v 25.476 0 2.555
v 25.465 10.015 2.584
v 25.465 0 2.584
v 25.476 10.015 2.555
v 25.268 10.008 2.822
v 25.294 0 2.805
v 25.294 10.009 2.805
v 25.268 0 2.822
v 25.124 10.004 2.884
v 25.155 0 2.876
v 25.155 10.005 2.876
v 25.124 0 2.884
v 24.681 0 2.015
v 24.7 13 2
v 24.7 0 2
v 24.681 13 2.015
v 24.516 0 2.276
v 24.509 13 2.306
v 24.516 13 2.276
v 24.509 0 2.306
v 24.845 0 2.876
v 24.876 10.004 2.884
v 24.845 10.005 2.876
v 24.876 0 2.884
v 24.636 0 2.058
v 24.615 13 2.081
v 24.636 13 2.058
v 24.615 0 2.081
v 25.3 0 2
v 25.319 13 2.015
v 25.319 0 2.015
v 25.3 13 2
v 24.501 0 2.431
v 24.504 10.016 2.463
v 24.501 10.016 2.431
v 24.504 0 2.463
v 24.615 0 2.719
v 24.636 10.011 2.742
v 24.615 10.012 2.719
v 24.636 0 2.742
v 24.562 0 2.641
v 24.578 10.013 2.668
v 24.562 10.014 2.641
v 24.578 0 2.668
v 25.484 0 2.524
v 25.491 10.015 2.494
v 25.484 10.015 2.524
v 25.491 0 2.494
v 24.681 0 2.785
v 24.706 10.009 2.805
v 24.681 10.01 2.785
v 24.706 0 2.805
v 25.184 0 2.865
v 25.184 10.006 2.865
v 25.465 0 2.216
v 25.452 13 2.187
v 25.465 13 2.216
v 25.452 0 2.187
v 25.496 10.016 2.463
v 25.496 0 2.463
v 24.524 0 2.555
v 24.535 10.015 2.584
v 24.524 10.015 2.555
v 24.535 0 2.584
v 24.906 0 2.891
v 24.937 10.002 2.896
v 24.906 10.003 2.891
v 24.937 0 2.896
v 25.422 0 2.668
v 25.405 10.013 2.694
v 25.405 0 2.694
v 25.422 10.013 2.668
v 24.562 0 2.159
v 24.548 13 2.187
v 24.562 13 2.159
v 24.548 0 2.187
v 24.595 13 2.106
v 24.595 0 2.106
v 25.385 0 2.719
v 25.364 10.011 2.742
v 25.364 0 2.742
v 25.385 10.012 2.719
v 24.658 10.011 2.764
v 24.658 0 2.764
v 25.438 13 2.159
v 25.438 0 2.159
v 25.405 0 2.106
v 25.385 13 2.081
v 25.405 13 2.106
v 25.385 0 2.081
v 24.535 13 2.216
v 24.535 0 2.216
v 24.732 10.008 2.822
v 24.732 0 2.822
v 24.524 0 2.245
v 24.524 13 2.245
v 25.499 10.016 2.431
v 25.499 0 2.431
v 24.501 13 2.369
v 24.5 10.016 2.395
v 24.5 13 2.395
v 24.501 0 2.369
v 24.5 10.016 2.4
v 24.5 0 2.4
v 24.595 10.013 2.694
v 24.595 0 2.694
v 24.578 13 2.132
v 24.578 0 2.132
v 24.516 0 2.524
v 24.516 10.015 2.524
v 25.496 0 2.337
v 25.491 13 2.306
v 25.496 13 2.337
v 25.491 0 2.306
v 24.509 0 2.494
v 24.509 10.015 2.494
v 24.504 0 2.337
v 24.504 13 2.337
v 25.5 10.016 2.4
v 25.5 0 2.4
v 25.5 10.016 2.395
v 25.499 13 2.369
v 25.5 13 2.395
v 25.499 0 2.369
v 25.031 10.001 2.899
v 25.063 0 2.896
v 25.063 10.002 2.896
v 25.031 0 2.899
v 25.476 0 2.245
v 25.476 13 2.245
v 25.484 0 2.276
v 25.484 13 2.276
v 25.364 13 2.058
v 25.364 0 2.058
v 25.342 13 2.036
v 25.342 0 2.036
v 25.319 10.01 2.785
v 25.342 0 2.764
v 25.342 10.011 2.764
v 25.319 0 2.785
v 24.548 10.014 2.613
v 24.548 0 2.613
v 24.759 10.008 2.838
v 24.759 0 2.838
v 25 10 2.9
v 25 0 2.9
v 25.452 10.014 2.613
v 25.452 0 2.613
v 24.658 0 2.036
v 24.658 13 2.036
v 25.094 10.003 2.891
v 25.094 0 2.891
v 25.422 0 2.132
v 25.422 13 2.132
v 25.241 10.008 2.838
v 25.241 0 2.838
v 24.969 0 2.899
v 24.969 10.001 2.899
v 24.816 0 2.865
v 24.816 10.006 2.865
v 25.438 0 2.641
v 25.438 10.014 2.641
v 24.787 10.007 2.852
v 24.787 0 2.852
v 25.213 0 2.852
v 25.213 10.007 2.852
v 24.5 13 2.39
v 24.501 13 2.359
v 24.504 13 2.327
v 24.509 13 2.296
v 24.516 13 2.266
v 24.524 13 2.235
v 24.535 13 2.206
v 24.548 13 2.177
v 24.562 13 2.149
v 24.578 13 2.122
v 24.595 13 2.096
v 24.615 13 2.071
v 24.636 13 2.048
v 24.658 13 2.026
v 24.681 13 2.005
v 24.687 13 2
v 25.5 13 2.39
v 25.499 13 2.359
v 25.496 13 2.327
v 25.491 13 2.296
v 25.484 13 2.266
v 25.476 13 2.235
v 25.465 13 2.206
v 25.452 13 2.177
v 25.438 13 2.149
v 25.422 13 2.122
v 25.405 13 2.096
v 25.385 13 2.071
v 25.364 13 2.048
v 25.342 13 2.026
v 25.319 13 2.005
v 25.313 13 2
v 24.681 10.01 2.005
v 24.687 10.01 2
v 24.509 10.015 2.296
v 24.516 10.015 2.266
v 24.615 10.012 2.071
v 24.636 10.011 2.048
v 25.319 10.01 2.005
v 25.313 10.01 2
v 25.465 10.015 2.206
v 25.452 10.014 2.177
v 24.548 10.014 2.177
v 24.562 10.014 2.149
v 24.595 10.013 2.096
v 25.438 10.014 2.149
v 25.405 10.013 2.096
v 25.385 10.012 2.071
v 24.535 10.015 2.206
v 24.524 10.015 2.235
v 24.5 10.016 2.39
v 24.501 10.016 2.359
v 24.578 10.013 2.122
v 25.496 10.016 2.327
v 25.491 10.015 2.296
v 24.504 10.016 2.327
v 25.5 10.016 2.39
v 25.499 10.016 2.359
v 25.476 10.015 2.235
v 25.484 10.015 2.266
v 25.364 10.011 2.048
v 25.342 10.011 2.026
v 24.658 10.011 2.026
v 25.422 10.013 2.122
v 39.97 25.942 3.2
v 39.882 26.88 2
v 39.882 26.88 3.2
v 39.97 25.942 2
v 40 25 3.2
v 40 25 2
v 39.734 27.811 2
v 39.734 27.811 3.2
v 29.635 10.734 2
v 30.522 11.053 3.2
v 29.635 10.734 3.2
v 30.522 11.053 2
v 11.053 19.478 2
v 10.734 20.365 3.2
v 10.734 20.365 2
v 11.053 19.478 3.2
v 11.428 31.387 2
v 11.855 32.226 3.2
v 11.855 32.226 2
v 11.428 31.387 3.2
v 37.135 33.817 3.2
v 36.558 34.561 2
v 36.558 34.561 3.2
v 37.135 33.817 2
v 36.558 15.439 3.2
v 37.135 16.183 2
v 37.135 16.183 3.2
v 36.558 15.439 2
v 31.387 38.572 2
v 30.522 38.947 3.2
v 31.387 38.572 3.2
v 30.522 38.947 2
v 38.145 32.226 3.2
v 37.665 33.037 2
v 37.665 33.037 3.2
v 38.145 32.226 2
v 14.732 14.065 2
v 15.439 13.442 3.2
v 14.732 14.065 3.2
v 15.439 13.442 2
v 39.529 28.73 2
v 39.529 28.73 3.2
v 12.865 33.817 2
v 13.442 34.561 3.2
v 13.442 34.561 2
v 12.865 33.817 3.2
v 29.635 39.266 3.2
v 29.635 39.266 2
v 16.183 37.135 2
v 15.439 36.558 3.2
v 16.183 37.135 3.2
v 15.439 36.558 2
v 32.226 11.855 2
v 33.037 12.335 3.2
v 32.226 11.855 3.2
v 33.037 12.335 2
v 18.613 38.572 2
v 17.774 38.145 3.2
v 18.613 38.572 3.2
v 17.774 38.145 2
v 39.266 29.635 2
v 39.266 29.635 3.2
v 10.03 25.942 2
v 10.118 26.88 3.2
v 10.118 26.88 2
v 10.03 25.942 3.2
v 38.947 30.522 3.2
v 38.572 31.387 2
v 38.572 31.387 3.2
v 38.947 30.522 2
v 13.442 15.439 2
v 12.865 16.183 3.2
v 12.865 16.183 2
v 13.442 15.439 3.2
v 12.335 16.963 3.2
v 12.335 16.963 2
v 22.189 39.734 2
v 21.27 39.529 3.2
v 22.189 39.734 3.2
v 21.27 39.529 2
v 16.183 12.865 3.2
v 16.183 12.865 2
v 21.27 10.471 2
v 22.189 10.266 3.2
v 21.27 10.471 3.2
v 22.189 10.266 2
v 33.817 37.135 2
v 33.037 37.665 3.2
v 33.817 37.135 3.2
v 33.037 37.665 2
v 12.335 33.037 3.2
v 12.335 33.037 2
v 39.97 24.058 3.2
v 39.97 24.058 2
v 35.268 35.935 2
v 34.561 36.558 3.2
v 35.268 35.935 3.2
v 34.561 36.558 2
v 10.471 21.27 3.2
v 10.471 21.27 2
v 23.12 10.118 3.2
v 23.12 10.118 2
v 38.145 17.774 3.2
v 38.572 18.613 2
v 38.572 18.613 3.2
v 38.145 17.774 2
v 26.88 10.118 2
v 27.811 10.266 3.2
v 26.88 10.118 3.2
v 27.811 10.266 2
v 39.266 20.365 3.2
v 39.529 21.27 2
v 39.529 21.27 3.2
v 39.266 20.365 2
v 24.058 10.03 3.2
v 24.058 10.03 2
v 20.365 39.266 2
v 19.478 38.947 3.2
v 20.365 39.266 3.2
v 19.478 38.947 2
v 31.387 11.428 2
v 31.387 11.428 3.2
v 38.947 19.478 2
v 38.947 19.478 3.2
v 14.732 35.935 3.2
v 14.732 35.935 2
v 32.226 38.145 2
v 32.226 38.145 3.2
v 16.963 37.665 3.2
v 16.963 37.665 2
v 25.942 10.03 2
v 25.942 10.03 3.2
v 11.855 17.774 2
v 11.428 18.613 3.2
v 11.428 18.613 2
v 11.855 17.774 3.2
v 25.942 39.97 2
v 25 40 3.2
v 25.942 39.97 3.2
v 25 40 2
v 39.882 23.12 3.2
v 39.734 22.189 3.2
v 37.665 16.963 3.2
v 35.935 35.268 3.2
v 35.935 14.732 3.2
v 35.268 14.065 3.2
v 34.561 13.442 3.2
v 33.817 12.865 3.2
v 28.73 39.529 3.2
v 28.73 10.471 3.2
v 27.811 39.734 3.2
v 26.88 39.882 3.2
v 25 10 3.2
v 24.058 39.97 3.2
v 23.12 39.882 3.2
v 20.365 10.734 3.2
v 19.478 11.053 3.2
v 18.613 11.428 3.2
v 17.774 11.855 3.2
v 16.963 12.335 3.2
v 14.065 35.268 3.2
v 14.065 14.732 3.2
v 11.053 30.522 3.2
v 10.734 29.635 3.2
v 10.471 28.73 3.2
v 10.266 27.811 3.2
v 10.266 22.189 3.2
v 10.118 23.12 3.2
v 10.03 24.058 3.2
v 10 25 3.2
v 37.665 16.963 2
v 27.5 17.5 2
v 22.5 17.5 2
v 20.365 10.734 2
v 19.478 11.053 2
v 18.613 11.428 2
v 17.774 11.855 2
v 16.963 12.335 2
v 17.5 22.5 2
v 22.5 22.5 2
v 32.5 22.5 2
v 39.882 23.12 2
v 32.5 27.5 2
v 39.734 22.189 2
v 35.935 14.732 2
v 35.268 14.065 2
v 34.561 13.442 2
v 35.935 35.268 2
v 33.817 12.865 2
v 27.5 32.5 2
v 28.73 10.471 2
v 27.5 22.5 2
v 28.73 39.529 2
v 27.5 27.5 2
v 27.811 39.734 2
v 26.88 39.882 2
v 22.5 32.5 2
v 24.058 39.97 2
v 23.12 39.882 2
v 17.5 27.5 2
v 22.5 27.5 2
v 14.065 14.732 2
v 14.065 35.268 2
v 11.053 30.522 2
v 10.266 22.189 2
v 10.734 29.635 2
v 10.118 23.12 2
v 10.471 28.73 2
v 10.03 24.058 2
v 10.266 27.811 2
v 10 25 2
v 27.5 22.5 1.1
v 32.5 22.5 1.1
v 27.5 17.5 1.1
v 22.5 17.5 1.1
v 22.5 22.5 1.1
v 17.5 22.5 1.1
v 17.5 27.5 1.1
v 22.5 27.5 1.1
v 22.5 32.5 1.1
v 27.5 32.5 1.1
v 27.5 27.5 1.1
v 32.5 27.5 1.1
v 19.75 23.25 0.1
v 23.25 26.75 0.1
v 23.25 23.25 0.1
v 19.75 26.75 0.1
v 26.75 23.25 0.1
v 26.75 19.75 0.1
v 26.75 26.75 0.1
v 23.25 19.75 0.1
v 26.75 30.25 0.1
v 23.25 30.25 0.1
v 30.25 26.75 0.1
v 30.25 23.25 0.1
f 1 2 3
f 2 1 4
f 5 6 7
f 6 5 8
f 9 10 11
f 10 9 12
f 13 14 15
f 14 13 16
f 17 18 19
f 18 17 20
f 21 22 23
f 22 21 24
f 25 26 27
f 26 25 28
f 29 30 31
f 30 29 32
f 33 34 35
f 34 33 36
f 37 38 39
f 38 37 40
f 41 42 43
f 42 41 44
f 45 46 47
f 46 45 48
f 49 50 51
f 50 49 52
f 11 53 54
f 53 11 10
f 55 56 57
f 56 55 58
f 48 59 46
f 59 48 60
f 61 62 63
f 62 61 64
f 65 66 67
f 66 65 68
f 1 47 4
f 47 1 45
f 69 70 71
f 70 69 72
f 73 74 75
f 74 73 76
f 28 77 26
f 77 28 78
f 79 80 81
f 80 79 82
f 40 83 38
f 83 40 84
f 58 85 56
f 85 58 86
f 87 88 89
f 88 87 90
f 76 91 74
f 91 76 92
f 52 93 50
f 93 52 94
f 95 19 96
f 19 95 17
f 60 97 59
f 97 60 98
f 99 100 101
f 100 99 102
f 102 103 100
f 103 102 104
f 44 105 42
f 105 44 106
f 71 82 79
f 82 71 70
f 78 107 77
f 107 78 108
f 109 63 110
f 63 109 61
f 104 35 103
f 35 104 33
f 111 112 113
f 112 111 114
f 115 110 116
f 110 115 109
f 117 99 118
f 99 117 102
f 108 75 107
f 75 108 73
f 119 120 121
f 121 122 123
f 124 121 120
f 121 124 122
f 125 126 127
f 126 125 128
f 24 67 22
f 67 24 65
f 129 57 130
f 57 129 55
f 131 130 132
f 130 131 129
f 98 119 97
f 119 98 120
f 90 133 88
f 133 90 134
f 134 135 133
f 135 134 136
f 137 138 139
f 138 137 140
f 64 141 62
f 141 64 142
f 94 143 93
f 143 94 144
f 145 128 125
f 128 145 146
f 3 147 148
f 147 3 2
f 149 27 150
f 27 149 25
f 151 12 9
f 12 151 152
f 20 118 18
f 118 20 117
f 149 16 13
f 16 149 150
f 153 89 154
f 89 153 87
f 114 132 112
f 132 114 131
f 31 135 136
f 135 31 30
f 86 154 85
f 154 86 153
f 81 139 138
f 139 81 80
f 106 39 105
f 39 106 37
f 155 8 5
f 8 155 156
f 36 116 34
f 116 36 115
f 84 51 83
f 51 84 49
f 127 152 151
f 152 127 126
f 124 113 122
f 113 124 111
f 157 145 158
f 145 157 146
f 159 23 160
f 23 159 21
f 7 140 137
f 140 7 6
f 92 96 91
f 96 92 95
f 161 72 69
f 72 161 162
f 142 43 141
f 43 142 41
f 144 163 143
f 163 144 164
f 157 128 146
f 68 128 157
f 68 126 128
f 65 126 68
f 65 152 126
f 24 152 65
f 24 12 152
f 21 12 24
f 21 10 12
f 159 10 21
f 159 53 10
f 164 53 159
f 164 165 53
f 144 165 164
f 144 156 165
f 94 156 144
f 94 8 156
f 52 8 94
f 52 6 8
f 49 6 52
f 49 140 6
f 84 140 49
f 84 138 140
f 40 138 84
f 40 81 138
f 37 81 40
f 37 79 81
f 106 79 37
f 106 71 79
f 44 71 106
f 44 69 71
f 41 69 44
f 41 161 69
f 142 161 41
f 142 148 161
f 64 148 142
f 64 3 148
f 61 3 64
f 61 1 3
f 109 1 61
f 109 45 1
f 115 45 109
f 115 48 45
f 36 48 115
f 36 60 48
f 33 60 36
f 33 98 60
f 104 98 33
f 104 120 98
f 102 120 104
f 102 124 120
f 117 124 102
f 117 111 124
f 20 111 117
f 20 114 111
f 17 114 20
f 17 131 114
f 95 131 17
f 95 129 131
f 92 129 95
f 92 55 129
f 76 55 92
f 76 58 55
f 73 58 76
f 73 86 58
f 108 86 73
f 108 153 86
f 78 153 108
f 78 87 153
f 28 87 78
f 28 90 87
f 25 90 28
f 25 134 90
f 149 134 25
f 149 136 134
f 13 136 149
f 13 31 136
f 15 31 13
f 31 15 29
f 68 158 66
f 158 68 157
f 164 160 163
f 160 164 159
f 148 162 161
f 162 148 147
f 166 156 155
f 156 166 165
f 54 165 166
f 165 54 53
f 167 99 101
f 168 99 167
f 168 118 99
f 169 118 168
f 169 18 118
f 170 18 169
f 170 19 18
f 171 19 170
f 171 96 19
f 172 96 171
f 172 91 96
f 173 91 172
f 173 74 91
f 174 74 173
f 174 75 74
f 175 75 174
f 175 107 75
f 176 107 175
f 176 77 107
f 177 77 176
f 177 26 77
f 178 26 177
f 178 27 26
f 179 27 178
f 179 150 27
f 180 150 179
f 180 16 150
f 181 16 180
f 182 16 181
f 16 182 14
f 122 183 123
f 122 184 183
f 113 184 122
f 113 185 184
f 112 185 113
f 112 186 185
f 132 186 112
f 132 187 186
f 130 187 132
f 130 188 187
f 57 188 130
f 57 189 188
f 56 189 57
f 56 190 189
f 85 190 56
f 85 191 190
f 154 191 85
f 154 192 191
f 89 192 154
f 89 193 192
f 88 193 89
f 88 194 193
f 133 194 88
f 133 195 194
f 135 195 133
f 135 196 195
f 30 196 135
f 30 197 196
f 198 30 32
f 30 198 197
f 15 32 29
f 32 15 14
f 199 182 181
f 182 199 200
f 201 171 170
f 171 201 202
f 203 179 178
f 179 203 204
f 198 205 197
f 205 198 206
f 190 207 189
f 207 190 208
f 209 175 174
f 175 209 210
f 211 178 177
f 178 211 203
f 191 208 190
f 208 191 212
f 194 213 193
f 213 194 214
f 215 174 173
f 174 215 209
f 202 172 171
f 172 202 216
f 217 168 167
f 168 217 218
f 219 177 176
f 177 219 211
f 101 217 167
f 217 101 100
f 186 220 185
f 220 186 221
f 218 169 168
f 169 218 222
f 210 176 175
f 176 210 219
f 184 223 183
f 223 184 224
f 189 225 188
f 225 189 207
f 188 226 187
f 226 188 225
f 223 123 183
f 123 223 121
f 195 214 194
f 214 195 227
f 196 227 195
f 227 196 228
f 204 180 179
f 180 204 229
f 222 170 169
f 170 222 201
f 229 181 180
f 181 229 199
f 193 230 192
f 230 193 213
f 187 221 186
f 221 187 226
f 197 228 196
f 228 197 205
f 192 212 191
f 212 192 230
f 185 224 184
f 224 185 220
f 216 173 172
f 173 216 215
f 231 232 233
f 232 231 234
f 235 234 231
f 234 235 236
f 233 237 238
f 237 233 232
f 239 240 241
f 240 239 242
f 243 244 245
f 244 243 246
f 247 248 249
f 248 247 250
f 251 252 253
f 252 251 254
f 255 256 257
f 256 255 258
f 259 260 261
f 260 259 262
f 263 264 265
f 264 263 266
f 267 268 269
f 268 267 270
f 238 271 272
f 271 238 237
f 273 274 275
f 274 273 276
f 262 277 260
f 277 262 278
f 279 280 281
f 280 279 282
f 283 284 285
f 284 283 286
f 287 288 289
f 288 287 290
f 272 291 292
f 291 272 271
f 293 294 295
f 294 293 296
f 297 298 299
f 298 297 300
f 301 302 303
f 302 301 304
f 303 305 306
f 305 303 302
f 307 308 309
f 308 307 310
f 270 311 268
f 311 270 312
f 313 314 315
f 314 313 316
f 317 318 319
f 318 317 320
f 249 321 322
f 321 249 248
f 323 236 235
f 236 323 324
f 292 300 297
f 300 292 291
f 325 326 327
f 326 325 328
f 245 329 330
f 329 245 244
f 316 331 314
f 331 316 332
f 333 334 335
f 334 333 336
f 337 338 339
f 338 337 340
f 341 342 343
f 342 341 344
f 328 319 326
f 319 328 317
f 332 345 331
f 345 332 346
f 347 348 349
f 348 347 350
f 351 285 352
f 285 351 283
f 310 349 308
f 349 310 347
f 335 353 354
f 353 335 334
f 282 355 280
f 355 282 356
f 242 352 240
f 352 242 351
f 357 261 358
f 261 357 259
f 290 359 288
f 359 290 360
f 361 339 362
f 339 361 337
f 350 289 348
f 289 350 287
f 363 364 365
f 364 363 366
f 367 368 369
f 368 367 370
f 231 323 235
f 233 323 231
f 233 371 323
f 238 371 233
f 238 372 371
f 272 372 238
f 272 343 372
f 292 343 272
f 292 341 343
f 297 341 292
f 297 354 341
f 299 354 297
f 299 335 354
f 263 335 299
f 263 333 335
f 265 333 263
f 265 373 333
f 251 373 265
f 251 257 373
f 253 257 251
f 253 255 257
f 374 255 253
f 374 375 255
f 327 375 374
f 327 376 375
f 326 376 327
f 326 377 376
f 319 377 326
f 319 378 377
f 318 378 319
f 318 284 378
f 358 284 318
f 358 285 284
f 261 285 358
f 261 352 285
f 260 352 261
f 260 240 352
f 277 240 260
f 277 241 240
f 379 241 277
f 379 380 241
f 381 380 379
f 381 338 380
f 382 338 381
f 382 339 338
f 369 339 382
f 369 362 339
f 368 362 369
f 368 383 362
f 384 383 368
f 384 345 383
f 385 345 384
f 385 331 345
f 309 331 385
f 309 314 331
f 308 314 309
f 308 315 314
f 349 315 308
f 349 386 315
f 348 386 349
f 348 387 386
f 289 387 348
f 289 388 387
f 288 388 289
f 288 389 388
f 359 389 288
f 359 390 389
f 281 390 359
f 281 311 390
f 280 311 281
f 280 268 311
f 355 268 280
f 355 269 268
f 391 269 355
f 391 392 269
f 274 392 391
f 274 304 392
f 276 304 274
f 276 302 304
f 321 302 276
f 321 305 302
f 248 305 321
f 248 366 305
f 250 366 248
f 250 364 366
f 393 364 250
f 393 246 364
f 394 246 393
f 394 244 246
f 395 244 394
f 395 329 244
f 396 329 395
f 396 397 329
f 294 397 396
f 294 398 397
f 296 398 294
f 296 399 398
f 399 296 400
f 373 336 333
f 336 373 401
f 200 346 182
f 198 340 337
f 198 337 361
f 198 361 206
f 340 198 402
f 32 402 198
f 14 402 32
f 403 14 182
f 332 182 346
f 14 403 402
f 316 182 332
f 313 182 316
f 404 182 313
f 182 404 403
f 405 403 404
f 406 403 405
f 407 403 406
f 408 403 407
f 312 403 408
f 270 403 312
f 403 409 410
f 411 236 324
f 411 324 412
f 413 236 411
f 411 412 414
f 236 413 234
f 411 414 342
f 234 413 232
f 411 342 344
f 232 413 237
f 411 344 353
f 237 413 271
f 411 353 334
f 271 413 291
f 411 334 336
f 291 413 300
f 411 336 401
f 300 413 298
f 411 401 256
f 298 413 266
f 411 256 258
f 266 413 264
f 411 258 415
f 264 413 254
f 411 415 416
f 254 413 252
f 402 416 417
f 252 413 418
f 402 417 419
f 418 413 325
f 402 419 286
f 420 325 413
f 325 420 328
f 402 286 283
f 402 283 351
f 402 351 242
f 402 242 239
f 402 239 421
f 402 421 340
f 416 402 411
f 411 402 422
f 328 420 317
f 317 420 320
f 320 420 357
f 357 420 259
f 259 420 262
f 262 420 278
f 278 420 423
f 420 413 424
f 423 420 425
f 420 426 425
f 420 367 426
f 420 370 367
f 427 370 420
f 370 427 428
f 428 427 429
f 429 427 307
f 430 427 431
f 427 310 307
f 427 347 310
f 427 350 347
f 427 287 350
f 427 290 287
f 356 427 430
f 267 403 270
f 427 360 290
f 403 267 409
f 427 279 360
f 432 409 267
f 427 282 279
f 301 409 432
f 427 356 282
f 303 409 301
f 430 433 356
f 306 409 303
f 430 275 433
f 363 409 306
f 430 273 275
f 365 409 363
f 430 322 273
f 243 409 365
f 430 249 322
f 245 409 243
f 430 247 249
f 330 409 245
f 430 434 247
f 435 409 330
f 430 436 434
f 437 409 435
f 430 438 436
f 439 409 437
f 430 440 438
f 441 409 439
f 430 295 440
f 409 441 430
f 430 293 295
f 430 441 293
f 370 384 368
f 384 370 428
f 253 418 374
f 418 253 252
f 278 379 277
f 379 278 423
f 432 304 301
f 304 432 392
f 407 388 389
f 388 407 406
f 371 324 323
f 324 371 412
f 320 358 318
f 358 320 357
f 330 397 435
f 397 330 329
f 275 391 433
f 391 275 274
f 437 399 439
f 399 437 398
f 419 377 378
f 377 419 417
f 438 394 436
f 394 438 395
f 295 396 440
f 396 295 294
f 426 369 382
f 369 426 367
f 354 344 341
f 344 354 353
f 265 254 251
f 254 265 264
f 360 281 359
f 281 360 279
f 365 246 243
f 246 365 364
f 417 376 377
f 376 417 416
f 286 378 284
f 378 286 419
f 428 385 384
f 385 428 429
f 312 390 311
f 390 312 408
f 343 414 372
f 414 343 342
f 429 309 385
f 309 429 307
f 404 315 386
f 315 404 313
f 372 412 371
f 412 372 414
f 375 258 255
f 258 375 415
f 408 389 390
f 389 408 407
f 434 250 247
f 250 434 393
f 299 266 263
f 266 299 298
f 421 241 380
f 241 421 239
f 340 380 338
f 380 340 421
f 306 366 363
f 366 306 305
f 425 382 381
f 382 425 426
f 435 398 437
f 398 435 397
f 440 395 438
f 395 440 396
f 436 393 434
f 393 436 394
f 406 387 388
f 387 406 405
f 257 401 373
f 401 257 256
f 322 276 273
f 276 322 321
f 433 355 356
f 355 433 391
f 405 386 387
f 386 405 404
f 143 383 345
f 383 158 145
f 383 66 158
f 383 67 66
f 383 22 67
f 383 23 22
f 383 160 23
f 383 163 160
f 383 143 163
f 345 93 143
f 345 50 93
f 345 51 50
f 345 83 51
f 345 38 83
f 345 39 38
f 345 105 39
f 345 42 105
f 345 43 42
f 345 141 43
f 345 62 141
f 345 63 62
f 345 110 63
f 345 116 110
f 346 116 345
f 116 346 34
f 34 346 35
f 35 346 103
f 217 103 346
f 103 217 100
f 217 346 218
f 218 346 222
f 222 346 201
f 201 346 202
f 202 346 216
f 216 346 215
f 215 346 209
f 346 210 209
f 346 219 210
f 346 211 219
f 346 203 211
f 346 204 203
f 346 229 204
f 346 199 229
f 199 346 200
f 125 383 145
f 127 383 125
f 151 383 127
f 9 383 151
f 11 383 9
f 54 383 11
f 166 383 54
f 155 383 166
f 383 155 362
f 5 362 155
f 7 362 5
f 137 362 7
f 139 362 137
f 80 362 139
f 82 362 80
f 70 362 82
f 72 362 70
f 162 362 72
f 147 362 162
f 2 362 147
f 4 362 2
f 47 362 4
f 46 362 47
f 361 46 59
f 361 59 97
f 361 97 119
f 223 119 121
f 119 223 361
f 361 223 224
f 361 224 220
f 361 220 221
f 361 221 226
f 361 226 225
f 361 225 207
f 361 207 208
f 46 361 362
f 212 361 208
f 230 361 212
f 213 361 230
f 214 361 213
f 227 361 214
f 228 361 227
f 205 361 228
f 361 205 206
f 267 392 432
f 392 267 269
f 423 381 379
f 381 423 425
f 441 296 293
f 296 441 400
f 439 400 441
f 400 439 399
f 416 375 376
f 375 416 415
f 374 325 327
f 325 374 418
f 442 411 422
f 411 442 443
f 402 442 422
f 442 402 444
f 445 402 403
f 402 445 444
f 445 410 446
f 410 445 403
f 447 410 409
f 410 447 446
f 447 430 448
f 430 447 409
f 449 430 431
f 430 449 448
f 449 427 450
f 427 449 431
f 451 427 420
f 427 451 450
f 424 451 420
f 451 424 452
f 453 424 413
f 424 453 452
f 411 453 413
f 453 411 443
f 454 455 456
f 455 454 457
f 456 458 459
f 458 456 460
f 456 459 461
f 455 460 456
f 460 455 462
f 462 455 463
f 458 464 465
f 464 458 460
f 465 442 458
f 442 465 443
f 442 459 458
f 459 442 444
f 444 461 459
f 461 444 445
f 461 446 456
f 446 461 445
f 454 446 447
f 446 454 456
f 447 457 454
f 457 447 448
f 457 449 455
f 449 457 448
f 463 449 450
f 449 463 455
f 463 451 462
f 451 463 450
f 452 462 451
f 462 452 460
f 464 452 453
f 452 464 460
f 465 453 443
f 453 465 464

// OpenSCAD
//(c) Inne Lemstra
/* Based on softrobotics bubble mold v4*/
//has new air inlet system
$fn = 100;

render_bubble = true;
render_bubble_air_inlet = true;
render_bubble_inlet_hole = true;
render_screw_pillars = false;
render_walls_plexi = false;
render_walls_print = false;
render_grooves = false;
render_base = false;

render_bubble_needle_inlet = false;


render_component_central_cross = false;
render_component_pillar = false;
render_component_pillar_cross = false;
render_component_central_tube = false;
render_component_inverse_pillar = false;
render_component_air_inlet = false;

h_box = 10;
thickness_box = 3;

thickness_plexi = 3.2; // how thick the plexiglass is
groove_plexi = 1.5; //how deep the groove is
offset_groove = 10; //space the base extends past plexi walls

//plexiglass walls
ratio_plexi_connect = 0.7; //for the gaps in the backplate
h_plexi_front = 15; //heigth front panel (so it can slide in/out)
h_plexi = 20; //heigth for the rest of the panels

dia_screw = 3.5;
offset_screw = 6;

len_base = 50;
w_base = 50; // unnecesary for now because base is square
h_base = 2;


dia_air_pocket = 30;
h_air_pocket = 1.2; //heigth air pocket


//air inlet parameters
n_inlets = 2; //does not seem to work

dia_coupler = 1;
len_coupler = 4;

len_transition = 2;

dia_supply_tube = 1;
len_supply_tube = 13;
offset_tube_h = dia_supply_tube * 0.40;



w_connector_base = 5;
h_connector_base = 2;   //mayve this should be h_base by default

corner_coord = [[0,0], [0,1], [1,1], [1,0]];


module air_inlet(len_coupler, dia_coupler, len_transition, dia_supply_tube, len_supply_tube ,offset_tube_h,  len_base, h_base){

    difference(){
        union(){
    color("blue"){
        rotate([0,90,0]){
        //supply_tube
            translate([-h_base - offset_tube_h,0,0]){
        //coupler
            cylinder(len_coupler, d = dia_coupler);
            //transision piece
            translate([0, 0 , len_coupler]){
                cylinder(len_transition, d1 = dia_coupler, d2 = dia_supply_tube);
            }
        //supply tube
            cylinder(len_supply_tube, d = dia_supply_tube);
        }
    }
    }
    }
    neg_z_zone = 50; //make sure everything below z axis gets removed
    translate([0,dia_coupler / -2, -neg_z_zone]){
        cube([len_supply_tube* 1.1, dia_coupler * 1.1, h_base +neg_z_zone]);
        }
    
}
}

module bar_connect(width, length, depth){
        union(){
    //move connector under z plane of origin
        translate([0,0, -depth /2]){
            //left most side
            translate([-width, 0,0]) cube([width, length, depth], center = true);
            //middle side
            cube([width, length, depth], center = true);            
            //right most side
            translate([width, ,0]) cube([width, length, depth], center = true);
        }
    }
    
    }
    
module draw_cross(width){
    //draws a 2D cross/plus shape total width is 3 * width
    union(){   
            //left most side
            translate([-width, 0,0]) square([width, width], center = true);
            //middle side
            square([width, width], center = true);
            //midle top
            translate([0, width, 0]) square([width, width], center = true);
            //midle bottom
            translate([0, -width, 0]) square([width, width], center = true);
            
            //right most side
            translate([width, ,0]) square([width, width], center = true);
        }
}
    

module cross_connect(width, depth, taper_size = 0.7, taper_ratio = 0.5){
    
     if(taper_ratio < 1){
        linear_extrude(height = depth * (1 - taper_ratio)) draw_cross(width);
     }
     if(taper_ratio > 0){
        translate([0, 0,depth * (1 - taper_ratio)]){
            linear_extrude(height = depth * taper_ratio, scale = taper_size){
            draw_cross(width);
            }
        }
    }
}


module make_screw_pillars(len_base, dia_screw, offset_screw, h_base, h_box, corner_coord, taper_size = 0.8, taper_ratio = 0.3 ,n = 4){
    translate([0,0,h_base]){
        for(i = [0:n-1]){
        coord_x  = len_base * corner_coord[i][0];
        coord_y  = len_base * corner_coord[i][1];
        // * -2 + [1,1] makes coord 0 (+) and 1 (-)
        corner_offset = (corner_coord[i] * -2 + [1, 1]) * offset_screw;
        translate([coord_x + corner_offset[0], coord_y + corner_offset[1], 0]){
            color("orange"){
                if(!render_component_inverse_pillar){
        cylinder(h_box - h_base, d = dia_screw);
                }else{
                translate([0,0,h_base])
                    cylinder(h_box - h_base, d = dia_screw);
            }
            }
            color("red"){
                if(!render_component_inverse_pillar){
                rotate([0,180,0]) cross_connect(2, h_base, taper_size, taper_ratio);
                }else{
                cross_connect(2, h_base, taper_size, taper_ratio);
             }
            }
        }
            //echo(corner_offset);  
        }
}
}

module make_volume_marks(h_plexi, groove_plexi, len_plexi, w_thick = 4, h_thick = 0.5, nr_size = 2, step_volume = 2.5){
    
    for(idx =[0:step_volume:h_plexi - step_volume + 0.1]){
    
    color("blue"){
        translate([len_plexi/2, idx + groove_plexi, 0]){
            square([w_thick, h_thick], center = true);
            translate([w_thick/2 + 2, - nr_size/2,0]){
            text(str(idx), nr_size);
            }
        }
    }
}

}

if(render_base){
    difference(){
    //ground plate
        cube([len_base, len_base, h_base]);
        translate([len_base / 2, w_base/ 2, -0.1]){
           cross_connect(w_connector_base, h_base + 0.2, taper_size = 1, taper_ratio = 0.5);
        }
        make_screw_pillars(len_base, dia_screw, offset_screw, h_base, h_box,corner_coord, taper_size = 1, taper_ratio = 1);
        
    }
}


//screw locations
if(render_screw_pillars){
for(i = [0:3]){
    coord_x  = len_base * corner_coord[i][0];
    coord_y  = len_base * corner_coord[i][1];
    // * -2 + [1,1] makes coord 0 (+) and 1 (-)
    corner_offset = (corner_coord[i] * -2 + [1, 1]) * offset_screw;
    translate([coord_x + corner_offset[0], coord_y + corner_offset[1], h_base]){
        color("orange"){
    cylinder(h_box - h_base + 0.01, d = dia_screw);
        }
        color("red"){
            cross_connect(2, h_base);
        }
    }
  echo(corner_offset);  
}
}



if(render_bubble){
    if(render_bubble_air_inlet){
        
       // for(i = [0:n_inlet){
        //left inlet
//                    translate([0, len_base / 2 , 0]){
//                        air_inlet(len_coupler, dia_coupler, len_transition, dia_supply_tube, len_supply_tube ,offset_tube_h,  len_base, h_base);
//                    }
         //bottom inlet    
        translate([len_base/2, 0]){rotate([0,0,90]){
            air_inlet(len_coupler, dia_coupler, len_transition, dia_supply_tube, len_supply_tube ,offset_tube_h,  len_base, h_base);
        }}
    }
    
   // }
    
    if(render_bubble_inlet_hole){
        difference(){
            color("green"){
               translate([len_base / 2, len_base / 2,  h_base]){ 
                   cylinder(h_air_pocket, d = dia_air_pocket);      
                }
            }
            //hole to mount seperate inlets
                     //bottom inlet    
        translate([len_base/2, 0, -.01]){rotate([0,0,90]){
            //cylinder( len_coupler + len_transition +len_supply_tube , d= dia_supply_tube);
            #air_inlet(len_coupler, dia_coupler, len_transition, dia_supply_tube, len_supply_tube ,offset_tube_h,  len_base, h_base);
        }}
        }
    }else {
            color("green"){
               translate([len_base / 2, len_base / 2,  h_base]){ 
                   cylinder(h_air_pocket, d = dia_air_pocket);      
                }
            }            
    }
        
      
    
    color("red"){
        //move cross center base
        translate([len_base / 2, w_base/ 2, h_base+ .1]){
            rotate([0, 180, 0]){
            cross_connect(w_connector_base, h_connector_base);
            }
        }
    }
    
    
    //end render_bubble if statement
}


if(render_walls_print){ 
    color("purple"){
        //bruteforce walls enclosure
        //x direction wall, origin
        translate([0, -thickness_box, 0]){
            cube([len_base ,thickness_box, h_box]);
        }
        //y direction wall origin
        translate([-thickness_box, -thickness_box , 0]){
            cube([thickness_box, len_base + 2*thickness_box, h_box]);
        }
        
        //x direction wall oposit
        translate([0, len_base, 0]){
            cube([len_base ,thickness_box, h_box]);
        }
        
    }
    
    color("pink"){
        translate([len_base,0,0]){
            difference(){
            union(){
                //floor plate
                cube([10, len_base, h_base]);
                //origin wall
                translate([0, -thickness_box, 0]){
                    cube([10, thickness_box, h_box]);
                }
                translate([0, len_base, 0]){
                    cube([10 ,thickness_box, h_box]);
                }
            }
            //plexiglass wall
            //move wall a bit into box_wall
            translate([0, -groove_plexi, h_base - groove_plexi]){
                cube([thickness_plexi ,len_base + 2*groove_plexi, h_box]);
            }
            }
        }
        
    }
}


if(render_walls_plexi){
    //render the plexiglass walls for laser cutting
    //panel specific parameter
    len_panel = len_base + 2 * offset_groove;
    //side panel
        
    for(i  = [0,1]){
        translate([(len_panel + 0.01) * i, 0 ,0]){
            
            difference(){
                color("aqua")
                square([len_base + 2* offset_groove, h_plexi]);
                color("red"){
                    translate([offset_groove - thickness_plexi, 0, 0])
                    square([thickness_plexi, h_plexi * ratio_plexi_connect]);
                    translate([len_base + offset_groove, 0,0])
                    square([thickness_plexi, h_plexi_front]);
                }
            }
        }
    }
    //back panel
    translate([(len_panel + 0.01) * 2, 0,0]){
        difference(){
            color("aqua")
            square([len_base + 2* offset_groove, h_plexi]);
            color("red"){
                //place y (both cuts)
            translate([0, h_plexi * ratio_plexi_connect,0]){
                //place left cut x
                translate([offset_groove - thickness_plexi, 0, 0])
                square([thickness_plexi, h_plexi * (1 - ratio_plexi_connect)]);
                //place right cut x
                translate([len_base + offset_groove,0,0])
                square([thickness_plexi, h_plexi * (1 - ratio_plexi_connect)]);
                }
            }
        }
    }
    //front panel
    translate([(len_panel + 0.01) * 3, 0,0]){
        difference(){
            color("aqua")
            square([len_base + 2 * offset_groove, h_plexi_front]);
            //engrave volume markings
            make_volume_marks(h_plexi_front, groove_plexi, len_base + 2*offset_groove);
        }
    }
}

if(render_grooves){
    
    difference(){
        //base extentions
        color("green"){union(){
            // the two side extentions
            translate([0, -offset_groove, 0]) 
                cube([len_base, offset_groove, h_base]);
            translate([0, len_base, 0])
                cube([len_base, offset_groove, h_base]);
            //back extention
            translate([-offset_groove, -offset_groove, 0])
                cube([offset_groove, len_base + 2*offset_groove, h_base]);
            //front extention
            translate([len_base, -offset_groove, 0])
                cube([offset_groove, len_base + 2*offset_groove, h_base]);
        }}
        //grooves
        color("lime"){union(){
            // 2 side grooves
            // lowest y one
            translate([-offset_groove, -thickness_plexi, h_base - groove_plexi])
                cube([len_base + 2 * offset_groove, thickness_plexi, h_base]);
            //highest y one
            translate([-offset_groove, len_base, h_base - groove_plexi])
                cube([len_base + 2 * offset_groove, thickness_plexi, h_base]);
            
            //back groove
            translate([-thickness_plexi, -offset_groove, h_base - groove_plexi])
                cube([thickness_plexi, len_base + 2 * offset_groove, h_base]);
            
            //front groove
            translate([len_base, -offset_groove, h_base - groove_plexi])
                cube([thickness_plexi, len_base + 2 * offset_groove, h_base]);
        }}
    }
}


if(render_component_central_cross){
    color("red"){
        cross_connect(w_connector_base, h_base, taper_size = .8, taper_ratio = .2);
    }       
} 
if(render_component_pillar){
    make_screw_pillars(len_base, dia_screw, offset_screw, h_base, h_box,corner_coord, n=1);
}

if(render_component_pillar_cross){
    cross_connect(2, h_base);
}

if(render_component_central_tube){
    color("red"){
        if(dia_coupler <= w_connector_base){
            cross_connect(w_connector_base, h_base);
            cylinder(h_box + h_base, d = dia_coupler);
        }else {
            rotate([180,0,0])
            cross_connect(w_connector_base, h_base);
            cylinder(h_box, d = dia_coupler);
        }
    }
}

if(render_component_air_inlet){
    
    air_inlet(len_coupler, dia_coupler, len_transition,                 dia_supply_tube, len_supply_tube ,offset_tube_h,  len_base, h_base);
                   
    
}
    
